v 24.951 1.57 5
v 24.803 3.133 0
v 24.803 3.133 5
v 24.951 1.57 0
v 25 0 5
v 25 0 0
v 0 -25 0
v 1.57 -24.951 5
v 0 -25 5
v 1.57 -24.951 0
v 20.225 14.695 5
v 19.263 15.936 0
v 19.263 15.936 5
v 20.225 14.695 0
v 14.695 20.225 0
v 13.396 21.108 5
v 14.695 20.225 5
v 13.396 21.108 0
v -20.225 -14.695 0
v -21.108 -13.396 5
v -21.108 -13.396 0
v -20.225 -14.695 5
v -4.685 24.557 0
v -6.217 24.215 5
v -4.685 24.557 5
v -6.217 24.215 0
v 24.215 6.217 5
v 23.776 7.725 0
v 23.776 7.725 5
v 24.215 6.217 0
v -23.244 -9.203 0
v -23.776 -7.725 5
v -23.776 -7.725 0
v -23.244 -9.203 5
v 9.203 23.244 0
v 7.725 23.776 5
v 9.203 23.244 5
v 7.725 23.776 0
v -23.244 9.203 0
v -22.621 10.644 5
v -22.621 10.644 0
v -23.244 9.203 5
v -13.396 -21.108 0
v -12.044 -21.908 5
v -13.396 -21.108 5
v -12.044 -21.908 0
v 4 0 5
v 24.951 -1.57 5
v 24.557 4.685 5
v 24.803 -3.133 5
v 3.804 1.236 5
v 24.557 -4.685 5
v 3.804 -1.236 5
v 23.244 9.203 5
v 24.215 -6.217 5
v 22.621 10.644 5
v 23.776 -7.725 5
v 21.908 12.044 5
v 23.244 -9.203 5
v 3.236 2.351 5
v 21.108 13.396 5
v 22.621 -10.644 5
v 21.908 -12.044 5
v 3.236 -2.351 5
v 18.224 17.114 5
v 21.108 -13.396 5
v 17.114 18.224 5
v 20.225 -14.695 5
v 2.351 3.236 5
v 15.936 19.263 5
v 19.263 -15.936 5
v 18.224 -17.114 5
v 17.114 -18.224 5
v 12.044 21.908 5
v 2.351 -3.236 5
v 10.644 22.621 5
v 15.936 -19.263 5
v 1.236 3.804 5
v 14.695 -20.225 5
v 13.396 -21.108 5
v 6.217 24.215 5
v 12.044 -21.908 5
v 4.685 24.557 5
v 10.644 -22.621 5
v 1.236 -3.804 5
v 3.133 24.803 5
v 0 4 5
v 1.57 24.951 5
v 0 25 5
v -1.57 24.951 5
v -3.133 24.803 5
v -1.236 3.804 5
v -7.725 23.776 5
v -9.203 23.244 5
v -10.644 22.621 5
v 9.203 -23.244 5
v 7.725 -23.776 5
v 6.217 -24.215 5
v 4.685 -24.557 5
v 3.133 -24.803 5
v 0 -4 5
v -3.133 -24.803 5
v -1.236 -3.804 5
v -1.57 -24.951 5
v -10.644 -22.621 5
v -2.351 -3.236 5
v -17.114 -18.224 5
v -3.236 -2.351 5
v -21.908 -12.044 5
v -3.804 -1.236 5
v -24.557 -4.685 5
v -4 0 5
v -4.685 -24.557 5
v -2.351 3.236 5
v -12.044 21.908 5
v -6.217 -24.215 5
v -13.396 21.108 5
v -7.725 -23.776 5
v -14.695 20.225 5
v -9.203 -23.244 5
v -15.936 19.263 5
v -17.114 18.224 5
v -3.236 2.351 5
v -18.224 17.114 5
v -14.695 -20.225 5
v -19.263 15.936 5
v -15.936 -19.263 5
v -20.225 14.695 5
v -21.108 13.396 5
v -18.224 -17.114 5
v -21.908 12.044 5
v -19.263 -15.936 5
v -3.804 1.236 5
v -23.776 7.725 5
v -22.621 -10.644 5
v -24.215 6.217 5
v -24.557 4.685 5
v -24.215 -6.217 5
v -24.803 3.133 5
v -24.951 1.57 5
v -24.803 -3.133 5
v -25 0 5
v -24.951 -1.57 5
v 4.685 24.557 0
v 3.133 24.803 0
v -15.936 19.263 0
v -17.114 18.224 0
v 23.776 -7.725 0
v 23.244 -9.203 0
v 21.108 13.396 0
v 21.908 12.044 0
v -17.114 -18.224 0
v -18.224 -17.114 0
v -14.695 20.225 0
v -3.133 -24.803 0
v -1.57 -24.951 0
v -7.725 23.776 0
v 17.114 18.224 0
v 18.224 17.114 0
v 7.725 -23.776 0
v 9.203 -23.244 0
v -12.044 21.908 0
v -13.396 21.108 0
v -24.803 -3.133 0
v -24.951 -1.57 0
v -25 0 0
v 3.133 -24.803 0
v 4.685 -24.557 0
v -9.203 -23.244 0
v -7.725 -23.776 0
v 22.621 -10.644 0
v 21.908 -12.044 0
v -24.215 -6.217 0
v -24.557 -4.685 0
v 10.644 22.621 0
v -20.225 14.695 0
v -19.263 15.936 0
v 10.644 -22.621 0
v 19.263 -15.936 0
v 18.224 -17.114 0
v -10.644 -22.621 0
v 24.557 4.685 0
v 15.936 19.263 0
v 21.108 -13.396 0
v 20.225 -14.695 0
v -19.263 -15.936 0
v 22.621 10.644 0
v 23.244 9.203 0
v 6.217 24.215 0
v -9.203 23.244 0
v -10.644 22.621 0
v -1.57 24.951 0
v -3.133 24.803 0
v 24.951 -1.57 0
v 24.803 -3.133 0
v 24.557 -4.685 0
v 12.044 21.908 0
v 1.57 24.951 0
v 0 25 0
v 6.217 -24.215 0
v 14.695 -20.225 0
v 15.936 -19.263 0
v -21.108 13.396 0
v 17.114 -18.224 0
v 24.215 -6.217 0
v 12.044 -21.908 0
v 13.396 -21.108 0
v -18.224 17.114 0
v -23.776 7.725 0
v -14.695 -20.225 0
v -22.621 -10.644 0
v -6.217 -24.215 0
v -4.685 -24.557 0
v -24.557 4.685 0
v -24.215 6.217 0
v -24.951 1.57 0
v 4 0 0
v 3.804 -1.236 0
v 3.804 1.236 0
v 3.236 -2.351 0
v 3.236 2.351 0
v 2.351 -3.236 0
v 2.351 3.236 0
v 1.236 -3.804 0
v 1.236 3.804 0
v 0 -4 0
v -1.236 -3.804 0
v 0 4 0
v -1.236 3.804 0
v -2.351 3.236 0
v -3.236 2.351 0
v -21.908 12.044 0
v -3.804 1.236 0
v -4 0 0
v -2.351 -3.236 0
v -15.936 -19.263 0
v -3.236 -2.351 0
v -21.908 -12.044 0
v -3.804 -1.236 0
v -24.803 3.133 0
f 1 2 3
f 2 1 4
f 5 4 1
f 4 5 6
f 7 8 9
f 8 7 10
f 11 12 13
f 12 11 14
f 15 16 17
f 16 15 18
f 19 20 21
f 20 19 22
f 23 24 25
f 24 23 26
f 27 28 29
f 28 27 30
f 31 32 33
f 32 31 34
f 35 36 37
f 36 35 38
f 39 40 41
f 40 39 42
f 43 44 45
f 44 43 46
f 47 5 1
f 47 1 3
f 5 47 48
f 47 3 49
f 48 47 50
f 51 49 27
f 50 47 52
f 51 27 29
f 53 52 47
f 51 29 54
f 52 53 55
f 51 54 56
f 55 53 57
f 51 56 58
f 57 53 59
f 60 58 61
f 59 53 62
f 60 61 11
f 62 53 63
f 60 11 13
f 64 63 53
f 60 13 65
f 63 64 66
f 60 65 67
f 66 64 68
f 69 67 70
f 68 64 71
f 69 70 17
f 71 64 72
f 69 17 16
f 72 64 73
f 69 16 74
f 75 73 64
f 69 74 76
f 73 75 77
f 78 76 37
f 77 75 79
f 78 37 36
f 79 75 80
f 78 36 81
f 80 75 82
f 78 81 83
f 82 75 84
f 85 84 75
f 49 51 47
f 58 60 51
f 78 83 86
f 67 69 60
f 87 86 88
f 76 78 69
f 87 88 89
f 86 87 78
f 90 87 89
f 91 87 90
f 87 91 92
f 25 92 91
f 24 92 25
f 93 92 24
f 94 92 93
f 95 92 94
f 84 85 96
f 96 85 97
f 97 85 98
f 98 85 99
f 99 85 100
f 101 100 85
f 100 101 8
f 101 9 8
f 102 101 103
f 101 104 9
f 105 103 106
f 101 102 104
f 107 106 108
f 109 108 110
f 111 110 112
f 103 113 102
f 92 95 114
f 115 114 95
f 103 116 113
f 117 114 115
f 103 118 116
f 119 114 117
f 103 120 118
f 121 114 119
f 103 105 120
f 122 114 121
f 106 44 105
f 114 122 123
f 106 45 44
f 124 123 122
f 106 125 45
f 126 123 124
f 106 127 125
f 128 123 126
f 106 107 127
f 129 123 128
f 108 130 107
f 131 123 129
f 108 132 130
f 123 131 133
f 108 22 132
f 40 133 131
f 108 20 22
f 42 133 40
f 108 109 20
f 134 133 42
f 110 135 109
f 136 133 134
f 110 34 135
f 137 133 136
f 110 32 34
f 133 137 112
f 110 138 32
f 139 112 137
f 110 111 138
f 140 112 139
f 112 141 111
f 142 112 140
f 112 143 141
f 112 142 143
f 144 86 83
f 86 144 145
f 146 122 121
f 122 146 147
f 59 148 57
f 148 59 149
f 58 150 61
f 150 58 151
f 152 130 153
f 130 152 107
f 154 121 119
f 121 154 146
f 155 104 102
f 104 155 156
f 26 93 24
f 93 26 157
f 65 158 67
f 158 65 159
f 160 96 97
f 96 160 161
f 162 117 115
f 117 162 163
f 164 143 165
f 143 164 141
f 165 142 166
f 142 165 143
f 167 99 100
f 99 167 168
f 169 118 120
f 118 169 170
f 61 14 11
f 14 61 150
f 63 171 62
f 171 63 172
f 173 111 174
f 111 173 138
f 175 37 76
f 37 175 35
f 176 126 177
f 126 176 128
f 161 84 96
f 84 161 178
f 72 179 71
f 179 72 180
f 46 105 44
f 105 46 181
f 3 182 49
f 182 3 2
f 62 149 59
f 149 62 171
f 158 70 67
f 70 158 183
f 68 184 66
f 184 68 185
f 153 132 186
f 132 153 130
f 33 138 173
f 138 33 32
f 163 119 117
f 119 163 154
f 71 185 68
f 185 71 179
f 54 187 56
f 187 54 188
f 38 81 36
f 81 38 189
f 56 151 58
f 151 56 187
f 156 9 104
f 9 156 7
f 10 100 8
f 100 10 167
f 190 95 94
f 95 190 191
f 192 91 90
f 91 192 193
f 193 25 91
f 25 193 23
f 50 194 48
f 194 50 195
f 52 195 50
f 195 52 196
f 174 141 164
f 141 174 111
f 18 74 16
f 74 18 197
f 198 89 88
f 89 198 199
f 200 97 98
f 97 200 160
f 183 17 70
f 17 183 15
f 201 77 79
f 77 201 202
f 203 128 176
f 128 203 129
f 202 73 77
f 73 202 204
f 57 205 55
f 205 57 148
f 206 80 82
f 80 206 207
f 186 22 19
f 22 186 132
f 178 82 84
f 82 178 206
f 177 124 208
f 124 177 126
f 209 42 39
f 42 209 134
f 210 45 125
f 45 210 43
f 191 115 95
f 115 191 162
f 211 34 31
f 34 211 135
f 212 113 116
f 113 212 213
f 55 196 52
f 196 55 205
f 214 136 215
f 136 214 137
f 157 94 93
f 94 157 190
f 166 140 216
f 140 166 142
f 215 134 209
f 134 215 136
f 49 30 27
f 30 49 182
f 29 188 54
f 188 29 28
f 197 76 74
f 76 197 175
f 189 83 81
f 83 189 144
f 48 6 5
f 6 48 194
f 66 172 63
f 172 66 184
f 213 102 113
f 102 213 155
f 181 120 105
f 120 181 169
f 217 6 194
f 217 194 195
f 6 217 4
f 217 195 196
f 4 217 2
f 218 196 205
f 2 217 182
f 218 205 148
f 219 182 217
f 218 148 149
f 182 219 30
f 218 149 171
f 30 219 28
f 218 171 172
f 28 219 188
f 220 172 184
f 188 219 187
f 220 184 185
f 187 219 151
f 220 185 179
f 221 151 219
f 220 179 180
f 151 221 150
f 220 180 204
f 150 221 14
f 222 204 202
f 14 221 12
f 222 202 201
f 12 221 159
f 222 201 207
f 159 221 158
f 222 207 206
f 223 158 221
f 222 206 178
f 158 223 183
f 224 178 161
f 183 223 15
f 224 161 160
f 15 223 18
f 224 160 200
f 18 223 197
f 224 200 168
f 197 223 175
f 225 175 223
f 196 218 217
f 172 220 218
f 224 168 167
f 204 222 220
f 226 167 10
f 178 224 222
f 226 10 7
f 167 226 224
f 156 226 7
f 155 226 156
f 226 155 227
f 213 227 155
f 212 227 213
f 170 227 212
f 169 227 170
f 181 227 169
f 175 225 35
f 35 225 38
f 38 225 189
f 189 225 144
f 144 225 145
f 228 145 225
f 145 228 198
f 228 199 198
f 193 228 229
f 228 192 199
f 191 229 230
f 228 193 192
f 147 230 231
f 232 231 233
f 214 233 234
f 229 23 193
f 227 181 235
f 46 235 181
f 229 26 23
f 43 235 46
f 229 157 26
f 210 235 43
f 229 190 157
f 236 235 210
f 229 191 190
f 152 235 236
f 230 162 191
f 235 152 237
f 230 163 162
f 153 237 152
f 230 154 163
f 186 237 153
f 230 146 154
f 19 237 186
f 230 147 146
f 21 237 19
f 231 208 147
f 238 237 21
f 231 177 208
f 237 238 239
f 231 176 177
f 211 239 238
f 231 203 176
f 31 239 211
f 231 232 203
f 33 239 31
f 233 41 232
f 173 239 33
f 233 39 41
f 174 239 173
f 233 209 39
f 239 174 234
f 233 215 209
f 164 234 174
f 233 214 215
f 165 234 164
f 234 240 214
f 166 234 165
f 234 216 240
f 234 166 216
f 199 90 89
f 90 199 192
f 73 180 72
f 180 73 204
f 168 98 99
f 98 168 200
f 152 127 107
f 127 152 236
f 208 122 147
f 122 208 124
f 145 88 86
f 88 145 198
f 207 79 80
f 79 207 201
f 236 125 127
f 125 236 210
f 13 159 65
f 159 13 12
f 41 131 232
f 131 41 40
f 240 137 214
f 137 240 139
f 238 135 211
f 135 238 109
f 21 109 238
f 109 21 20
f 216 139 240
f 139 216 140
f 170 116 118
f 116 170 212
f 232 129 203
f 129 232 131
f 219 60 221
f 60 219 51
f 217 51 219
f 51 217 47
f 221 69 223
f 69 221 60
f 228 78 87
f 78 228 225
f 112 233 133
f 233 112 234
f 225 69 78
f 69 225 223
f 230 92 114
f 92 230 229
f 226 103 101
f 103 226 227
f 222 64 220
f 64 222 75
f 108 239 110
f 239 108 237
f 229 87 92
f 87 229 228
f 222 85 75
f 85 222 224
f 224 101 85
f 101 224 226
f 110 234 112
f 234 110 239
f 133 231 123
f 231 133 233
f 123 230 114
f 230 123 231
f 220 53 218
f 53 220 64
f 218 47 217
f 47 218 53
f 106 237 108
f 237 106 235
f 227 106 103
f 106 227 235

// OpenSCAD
//----------------------------------------------------------
//-- Tutorial OpenScad
//-- Juan Gonzalez-Gomez (Obijuan) juan@iearobotics.com
//----------------------------------------------------------
//-- (c) Mayo, 2012
//-- Licencia GPL
//----------------------------------------------------------
//-- Ejemplo de cómo hacer taladros
//----------------------------------------------------------

//-- Rueda simple
difference() {
  //-- Base de la rueda
  cylinder(r=50/2, h=5,$fn=100);

  //-- Taladro de 8mm
  cylinder(r=8/2, h=20,$fn=20,center=true);
}
